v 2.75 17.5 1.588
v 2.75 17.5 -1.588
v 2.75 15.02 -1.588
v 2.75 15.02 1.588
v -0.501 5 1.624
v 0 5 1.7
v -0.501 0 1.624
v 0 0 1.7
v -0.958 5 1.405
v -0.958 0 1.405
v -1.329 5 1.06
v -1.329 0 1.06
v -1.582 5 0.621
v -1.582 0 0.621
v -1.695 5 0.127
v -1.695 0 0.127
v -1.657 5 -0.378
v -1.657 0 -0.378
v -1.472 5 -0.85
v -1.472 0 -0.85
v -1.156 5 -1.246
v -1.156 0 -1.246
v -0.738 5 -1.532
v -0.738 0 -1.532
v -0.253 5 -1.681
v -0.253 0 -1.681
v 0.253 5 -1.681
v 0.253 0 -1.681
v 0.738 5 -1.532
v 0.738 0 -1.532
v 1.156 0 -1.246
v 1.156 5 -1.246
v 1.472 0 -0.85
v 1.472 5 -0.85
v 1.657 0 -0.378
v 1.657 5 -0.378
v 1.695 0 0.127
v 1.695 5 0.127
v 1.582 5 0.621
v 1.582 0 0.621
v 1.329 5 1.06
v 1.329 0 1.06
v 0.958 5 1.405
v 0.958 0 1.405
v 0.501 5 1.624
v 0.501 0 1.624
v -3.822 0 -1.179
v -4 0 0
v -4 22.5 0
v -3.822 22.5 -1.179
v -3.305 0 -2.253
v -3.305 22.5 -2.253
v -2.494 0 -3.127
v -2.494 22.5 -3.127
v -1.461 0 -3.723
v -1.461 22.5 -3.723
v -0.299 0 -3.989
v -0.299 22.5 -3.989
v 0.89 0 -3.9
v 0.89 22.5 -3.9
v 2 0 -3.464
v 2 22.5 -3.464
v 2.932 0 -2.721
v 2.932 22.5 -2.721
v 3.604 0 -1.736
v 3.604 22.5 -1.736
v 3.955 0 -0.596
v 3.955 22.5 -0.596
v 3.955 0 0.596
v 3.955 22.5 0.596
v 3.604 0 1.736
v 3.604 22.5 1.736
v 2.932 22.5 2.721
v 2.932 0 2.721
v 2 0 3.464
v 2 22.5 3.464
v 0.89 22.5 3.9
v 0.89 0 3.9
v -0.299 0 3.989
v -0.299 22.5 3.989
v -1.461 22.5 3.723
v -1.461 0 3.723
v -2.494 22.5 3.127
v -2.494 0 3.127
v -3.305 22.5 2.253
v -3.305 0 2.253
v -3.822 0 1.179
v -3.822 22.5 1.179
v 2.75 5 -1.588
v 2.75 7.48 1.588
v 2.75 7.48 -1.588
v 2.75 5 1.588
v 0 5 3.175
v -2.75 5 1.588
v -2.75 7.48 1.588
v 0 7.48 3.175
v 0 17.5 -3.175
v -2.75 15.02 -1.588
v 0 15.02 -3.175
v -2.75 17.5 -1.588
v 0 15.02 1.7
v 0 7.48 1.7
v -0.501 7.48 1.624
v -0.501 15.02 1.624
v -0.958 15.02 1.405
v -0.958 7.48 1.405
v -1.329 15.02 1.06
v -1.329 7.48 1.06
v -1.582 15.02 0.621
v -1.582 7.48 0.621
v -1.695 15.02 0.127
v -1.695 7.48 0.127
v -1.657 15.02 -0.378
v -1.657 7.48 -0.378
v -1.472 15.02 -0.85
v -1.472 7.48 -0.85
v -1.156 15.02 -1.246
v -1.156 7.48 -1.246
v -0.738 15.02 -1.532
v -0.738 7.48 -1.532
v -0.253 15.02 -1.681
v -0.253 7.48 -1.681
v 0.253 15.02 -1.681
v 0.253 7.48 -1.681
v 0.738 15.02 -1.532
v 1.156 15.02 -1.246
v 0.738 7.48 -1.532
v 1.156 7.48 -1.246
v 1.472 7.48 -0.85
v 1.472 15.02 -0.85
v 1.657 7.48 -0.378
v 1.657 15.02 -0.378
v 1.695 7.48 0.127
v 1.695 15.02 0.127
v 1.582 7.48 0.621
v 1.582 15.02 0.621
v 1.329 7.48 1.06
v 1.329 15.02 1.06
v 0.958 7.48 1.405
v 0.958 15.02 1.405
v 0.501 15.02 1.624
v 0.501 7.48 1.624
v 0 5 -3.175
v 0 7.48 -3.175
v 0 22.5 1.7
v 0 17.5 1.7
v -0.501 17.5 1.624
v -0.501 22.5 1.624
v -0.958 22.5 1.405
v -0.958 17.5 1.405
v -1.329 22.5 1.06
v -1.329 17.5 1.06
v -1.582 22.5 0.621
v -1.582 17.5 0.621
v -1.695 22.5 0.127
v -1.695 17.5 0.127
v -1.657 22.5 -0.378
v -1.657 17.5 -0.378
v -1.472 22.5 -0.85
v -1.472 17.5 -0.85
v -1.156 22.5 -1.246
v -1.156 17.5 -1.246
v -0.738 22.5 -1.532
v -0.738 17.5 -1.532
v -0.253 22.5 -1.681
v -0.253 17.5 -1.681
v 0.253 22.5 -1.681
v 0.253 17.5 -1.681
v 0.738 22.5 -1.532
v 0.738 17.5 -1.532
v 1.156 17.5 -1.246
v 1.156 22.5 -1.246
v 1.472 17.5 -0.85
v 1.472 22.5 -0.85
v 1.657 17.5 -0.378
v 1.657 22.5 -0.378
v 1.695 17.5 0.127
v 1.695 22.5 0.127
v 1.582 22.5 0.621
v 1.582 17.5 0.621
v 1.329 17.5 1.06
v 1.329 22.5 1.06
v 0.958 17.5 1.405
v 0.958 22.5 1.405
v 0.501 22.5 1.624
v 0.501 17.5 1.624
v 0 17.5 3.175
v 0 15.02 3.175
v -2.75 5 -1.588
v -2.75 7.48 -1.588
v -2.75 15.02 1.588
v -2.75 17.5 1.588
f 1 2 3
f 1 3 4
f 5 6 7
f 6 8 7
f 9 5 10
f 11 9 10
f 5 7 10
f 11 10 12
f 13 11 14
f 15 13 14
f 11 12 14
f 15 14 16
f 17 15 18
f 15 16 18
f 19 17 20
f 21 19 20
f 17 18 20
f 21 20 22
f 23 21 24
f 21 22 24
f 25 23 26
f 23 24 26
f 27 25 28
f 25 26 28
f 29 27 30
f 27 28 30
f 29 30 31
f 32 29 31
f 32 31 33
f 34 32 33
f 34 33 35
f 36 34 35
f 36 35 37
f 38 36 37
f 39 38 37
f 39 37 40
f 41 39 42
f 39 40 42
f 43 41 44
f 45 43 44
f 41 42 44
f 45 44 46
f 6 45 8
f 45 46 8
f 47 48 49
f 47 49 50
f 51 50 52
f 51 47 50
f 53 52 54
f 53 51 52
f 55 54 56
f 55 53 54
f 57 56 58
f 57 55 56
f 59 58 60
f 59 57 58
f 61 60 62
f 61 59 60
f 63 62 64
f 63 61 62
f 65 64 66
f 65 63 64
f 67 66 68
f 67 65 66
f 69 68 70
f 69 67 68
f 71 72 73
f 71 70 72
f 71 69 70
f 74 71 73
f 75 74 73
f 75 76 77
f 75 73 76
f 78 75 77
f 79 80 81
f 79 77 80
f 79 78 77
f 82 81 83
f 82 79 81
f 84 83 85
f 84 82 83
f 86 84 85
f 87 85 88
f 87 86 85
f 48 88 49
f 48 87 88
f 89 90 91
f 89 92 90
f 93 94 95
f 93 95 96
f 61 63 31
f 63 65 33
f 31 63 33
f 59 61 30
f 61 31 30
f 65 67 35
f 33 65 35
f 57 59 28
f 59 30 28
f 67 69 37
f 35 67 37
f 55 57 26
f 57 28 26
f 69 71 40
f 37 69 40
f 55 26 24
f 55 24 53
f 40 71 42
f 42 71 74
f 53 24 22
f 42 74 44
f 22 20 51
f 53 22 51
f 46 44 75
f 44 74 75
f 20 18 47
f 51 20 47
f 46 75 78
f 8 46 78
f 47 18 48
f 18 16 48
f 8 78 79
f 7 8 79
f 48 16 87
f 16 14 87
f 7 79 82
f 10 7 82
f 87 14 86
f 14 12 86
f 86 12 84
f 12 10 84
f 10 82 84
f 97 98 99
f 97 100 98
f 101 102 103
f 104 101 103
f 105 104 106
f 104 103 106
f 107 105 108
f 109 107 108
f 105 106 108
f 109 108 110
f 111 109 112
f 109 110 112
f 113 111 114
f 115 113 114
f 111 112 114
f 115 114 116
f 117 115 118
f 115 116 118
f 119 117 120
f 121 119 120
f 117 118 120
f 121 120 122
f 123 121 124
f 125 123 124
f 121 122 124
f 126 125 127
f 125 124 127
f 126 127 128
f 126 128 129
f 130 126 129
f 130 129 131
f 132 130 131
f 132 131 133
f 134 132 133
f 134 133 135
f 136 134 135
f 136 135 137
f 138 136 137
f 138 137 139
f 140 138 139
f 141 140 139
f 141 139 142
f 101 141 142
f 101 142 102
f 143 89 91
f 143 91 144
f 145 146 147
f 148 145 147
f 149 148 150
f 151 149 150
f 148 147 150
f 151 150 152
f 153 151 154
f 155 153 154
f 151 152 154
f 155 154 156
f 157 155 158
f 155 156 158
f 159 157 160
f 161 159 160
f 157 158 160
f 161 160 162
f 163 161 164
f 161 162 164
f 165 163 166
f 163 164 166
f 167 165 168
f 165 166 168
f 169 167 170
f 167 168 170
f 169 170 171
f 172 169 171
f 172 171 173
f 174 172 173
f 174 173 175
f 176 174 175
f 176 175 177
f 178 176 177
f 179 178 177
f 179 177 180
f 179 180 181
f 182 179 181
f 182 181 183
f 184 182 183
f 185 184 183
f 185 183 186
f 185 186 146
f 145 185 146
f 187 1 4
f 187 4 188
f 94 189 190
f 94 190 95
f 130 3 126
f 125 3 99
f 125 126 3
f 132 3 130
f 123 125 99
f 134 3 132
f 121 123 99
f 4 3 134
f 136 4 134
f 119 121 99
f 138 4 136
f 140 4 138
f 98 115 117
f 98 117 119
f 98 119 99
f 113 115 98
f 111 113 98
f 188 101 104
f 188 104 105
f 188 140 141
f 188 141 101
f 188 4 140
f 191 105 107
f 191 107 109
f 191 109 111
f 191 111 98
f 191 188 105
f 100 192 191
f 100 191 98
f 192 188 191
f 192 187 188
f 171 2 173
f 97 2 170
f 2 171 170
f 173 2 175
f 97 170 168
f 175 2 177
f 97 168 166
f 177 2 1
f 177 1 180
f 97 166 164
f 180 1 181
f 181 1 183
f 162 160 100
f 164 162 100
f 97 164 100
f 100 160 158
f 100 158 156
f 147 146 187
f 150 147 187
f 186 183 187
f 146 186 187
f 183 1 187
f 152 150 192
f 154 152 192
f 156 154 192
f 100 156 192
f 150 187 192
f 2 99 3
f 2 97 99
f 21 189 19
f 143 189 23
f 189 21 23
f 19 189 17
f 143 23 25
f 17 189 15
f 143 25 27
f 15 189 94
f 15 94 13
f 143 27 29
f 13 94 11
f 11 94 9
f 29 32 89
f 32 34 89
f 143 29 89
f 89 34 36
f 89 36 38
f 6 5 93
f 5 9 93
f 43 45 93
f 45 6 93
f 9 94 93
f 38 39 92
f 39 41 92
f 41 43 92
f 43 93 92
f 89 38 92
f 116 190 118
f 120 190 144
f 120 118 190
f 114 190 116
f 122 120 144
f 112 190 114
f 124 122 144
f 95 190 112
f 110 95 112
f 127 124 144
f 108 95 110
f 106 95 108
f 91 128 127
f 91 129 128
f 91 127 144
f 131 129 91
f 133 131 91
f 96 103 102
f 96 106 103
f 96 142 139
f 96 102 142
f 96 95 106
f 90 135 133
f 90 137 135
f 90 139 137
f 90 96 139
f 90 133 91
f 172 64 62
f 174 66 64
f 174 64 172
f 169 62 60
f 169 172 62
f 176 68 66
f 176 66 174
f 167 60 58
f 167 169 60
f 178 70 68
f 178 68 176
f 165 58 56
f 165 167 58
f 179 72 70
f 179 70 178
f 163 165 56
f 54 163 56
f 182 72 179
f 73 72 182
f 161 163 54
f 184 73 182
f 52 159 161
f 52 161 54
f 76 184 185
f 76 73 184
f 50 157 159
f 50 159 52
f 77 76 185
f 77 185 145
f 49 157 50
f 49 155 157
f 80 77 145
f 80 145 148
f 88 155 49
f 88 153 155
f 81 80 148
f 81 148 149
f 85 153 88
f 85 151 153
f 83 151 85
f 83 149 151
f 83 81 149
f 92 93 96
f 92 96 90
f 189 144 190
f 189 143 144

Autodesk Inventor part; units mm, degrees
ref_plane "YZ Plane" through (0, 0, 0) normal (1, 0, 0) x (0, 1, 0)
ref_plane "XZ Plane" through (0, 0, 0) normal (0, 1, 0) x (-1, 0, 0)
ref_plane "XY Plane" through (0, 0, 0) normal (0, 0, 1) x (1, 0, 0)
sketch "Sketch1" plane through (0, 0, 0) normal (0, 1, 0) x (-1, 0, 0)
  circle A0 centre (0, 0) radius 4
  dimension "d0" = 8
extrude "Extrusion1" add sketch "Sketch1" along normal blind 22.5
sketch "Sketch2" plane through (0, 22.5, 0) normal (0, 1, 0) x (1, 0, 0)
  point P0 (0, 0)
  point P1 (0, 0)
hole "Hole1" at (0, 22.5, 0) direction (0, -1, 0) diameter 3.4 end through all clearance for "Socket Head Cap Screw ISO 4762" size "M3" standard "ISO"
ref_plane "Work Plane1" through (0, 11.25, 0) normal (0, 1, 0) x (1, 0, 0)
mirror "Mirror1" about plane through (0, 11.25, 0) normal (0, 1, 0) of "Hole1"
ref_plane "Work Plane2" through (0, 5, 0) normal (0, -1, 0) x (1, 0, 0)
sketch "Sketch3" plane through (0, 5, 0) normal (0, -1, 0) x (1, 0, 0)
  circle A0 centre (0, 0) radius 2.75
  line L0 (-2.75, 1.5877) -> (0, 3.1754)
  line L1 (0, 3.1754) -> (2.75, 1.5877)
  line L2 (2.75, 1.5877) -> (2.75, -1.5877)
  line L3 (2.75, -1.5877) -> (0, -3.1754)
  line L4 (0, -3.1754) -> (-2.75, -1.5877)
  line L5 (-2.75, -1.5877) -> (-2.75, 1.5877)
  point P0 (-2.75, 0)
  dimension "d11" = 5.5
extrude "Extrusion2" cut sketch "Sketch3" against normal blind 2.48
mirror "Mirror2" about plane through (0, 11.25, 0) normal (0, 1, 0) of "Extrusion2"
properties part number "rod mount motor  for print"
